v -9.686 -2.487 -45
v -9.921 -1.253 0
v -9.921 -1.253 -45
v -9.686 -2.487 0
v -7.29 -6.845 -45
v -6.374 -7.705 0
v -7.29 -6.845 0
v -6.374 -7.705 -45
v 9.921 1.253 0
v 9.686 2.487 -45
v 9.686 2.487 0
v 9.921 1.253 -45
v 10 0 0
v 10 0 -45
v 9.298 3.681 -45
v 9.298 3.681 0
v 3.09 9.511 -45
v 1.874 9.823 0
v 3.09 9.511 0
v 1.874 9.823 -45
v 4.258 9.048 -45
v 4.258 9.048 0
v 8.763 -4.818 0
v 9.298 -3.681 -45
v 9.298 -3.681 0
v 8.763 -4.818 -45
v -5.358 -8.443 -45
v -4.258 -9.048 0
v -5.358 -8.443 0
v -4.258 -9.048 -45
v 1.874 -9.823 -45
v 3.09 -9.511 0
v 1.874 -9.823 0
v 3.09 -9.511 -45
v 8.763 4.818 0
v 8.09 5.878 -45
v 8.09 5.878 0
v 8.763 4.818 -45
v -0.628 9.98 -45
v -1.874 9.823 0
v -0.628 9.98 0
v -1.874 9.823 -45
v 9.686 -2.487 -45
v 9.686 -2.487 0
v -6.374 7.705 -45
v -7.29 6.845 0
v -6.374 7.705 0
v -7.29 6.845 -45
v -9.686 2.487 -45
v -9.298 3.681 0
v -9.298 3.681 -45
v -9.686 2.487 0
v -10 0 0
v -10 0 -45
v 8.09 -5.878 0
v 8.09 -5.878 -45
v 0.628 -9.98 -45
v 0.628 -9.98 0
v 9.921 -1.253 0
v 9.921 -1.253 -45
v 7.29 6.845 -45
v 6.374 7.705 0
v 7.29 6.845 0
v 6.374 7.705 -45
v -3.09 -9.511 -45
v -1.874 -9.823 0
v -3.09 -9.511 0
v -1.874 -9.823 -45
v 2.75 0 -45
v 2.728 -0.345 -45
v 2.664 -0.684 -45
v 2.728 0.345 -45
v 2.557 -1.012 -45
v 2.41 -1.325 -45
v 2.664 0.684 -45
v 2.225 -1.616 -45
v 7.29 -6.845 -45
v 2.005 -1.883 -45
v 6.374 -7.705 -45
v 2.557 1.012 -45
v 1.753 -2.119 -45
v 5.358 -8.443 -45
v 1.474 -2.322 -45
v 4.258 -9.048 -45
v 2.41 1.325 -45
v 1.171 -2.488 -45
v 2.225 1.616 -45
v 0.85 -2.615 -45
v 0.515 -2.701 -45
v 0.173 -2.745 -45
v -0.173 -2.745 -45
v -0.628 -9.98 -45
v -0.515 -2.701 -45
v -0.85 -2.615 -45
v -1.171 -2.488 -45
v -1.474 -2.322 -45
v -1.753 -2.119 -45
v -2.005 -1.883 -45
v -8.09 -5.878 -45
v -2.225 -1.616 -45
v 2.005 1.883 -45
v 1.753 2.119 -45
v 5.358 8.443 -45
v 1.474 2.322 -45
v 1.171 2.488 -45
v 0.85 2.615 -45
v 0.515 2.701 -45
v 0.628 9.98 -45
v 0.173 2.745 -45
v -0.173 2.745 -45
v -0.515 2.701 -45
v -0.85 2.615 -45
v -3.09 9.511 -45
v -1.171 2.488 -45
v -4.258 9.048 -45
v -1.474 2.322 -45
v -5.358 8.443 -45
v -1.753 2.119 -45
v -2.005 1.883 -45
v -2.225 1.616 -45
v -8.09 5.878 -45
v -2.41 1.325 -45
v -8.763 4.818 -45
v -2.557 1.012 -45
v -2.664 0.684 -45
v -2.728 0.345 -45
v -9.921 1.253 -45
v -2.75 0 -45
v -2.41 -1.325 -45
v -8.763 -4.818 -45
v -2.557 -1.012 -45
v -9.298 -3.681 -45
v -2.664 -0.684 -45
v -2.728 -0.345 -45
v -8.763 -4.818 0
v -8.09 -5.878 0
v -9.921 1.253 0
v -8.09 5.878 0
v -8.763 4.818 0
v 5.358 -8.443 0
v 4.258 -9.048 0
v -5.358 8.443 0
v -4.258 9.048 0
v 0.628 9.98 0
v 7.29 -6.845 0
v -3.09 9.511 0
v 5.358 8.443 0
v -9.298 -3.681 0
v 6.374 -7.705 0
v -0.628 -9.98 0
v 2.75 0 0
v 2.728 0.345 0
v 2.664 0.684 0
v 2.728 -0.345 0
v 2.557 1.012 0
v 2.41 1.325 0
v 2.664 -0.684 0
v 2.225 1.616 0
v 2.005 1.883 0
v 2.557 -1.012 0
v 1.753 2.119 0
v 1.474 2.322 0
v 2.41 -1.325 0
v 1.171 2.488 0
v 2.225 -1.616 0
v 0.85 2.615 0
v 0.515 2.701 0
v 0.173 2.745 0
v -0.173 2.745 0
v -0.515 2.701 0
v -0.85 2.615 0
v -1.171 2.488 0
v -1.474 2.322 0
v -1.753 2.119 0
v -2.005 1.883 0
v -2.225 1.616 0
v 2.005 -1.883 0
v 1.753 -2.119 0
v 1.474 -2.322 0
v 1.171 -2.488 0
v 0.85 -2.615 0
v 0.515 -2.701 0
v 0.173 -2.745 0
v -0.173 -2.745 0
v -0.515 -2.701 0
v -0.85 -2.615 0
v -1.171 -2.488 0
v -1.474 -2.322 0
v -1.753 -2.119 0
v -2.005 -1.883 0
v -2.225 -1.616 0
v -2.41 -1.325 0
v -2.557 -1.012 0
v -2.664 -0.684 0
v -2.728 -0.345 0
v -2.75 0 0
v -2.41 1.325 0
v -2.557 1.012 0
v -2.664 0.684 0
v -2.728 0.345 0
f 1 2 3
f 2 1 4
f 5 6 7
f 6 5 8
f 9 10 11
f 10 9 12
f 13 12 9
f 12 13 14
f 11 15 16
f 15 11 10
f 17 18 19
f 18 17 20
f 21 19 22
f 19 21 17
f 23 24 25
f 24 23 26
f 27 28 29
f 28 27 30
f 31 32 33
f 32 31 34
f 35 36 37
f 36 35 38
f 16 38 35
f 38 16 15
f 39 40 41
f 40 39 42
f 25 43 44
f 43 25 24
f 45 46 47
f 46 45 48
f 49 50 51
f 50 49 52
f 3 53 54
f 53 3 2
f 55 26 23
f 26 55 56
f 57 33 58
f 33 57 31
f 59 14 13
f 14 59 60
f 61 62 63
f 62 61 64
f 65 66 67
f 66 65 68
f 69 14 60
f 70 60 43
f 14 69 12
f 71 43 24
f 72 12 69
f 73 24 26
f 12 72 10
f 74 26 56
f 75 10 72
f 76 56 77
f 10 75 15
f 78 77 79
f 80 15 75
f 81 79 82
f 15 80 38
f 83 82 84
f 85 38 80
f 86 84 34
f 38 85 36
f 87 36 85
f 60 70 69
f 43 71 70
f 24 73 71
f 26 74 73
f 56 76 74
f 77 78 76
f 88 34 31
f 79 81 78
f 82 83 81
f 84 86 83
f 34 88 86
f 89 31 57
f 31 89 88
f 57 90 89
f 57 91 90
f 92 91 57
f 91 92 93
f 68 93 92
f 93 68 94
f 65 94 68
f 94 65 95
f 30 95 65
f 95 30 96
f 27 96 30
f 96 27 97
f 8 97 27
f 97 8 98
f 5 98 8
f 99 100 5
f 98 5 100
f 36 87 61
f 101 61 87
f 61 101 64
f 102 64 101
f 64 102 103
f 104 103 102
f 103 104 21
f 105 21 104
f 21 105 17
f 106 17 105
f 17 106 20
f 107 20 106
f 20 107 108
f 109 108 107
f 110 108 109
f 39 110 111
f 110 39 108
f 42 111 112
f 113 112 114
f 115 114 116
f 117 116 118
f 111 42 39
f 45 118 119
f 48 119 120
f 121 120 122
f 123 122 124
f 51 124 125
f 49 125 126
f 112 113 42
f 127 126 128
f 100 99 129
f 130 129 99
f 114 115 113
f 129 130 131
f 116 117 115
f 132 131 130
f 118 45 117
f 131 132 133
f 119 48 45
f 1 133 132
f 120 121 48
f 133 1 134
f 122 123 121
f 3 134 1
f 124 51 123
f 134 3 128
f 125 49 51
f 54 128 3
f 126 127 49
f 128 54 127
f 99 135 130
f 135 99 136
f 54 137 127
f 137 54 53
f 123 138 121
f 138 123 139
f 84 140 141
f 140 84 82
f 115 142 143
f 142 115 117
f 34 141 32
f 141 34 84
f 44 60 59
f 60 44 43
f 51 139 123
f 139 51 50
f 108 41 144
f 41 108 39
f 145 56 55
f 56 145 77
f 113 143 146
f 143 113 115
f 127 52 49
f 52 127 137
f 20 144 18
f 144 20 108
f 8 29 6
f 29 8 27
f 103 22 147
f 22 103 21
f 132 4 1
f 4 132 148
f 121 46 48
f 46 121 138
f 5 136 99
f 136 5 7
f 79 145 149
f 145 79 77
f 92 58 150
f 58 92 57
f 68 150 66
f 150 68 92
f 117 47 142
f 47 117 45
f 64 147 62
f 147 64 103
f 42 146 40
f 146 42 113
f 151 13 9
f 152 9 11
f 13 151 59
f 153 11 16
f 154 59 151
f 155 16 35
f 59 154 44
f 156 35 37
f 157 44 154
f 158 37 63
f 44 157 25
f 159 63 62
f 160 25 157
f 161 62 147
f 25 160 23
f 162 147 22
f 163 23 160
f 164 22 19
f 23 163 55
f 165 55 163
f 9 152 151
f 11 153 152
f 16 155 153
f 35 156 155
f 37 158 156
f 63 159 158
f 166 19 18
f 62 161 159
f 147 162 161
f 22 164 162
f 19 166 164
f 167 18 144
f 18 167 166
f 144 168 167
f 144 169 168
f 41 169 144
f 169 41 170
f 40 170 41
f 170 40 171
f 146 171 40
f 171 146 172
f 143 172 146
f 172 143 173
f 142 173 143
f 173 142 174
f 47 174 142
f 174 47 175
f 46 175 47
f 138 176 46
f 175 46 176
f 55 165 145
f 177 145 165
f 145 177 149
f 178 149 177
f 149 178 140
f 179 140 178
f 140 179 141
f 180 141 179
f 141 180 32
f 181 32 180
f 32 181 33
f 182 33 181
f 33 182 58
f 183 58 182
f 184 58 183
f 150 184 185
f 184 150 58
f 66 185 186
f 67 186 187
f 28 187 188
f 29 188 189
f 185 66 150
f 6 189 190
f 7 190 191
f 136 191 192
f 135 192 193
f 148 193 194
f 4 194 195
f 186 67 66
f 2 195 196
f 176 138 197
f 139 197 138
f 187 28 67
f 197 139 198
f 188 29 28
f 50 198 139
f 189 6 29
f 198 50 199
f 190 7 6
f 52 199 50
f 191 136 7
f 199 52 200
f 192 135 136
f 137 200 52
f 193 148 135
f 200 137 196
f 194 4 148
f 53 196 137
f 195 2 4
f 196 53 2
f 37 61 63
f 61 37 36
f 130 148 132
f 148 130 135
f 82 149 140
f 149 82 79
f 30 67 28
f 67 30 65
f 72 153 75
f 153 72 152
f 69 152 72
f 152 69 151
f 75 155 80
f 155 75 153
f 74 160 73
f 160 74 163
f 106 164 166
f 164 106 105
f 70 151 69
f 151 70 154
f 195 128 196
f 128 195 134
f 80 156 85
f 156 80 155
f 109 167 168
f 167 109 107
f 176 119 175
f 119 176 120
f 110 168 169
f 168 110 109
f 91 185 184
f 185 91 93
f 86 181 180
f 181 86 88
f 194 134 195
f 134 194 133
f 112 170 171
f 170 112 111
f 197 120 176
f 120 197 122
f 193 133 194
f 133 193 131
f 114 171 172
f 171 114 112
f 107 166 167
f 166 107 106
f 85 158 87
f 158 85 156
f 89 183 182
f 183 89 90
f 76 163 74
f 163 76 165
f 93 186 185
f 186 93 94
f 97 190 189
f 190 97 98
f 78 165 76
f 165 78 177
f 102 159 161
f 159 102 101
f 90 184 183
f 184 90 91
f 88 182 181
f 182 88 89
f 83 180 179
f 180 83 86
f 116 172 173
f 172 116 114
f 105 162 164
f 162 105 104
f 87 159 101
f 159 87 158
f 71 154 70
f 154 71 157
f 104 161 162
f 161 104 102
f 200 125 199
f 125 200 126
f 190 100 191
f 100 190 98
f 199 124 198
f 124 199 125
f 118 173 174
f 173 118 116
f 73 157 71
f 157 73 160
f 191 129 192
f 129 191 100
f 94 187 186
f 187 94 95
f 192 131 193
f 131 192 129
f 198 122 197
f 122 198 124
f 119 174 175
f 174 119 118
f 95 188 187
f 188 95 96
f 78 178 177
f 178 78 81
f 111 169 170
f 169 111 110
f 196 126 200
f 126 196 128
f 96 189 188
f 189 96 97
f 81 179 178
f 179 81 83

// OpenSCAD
$fn = 50;


difference() {
	union() {
		translate(v = [0, 0, -45.0000000000]) {
			cylinder(h = 45, r = 10.0000000000);
		}
	}
	union() {
		#translate(v = [0, 0, -45]) {
			cylinder(h = 45, r = 2.7500000000);
		}
	}
}
